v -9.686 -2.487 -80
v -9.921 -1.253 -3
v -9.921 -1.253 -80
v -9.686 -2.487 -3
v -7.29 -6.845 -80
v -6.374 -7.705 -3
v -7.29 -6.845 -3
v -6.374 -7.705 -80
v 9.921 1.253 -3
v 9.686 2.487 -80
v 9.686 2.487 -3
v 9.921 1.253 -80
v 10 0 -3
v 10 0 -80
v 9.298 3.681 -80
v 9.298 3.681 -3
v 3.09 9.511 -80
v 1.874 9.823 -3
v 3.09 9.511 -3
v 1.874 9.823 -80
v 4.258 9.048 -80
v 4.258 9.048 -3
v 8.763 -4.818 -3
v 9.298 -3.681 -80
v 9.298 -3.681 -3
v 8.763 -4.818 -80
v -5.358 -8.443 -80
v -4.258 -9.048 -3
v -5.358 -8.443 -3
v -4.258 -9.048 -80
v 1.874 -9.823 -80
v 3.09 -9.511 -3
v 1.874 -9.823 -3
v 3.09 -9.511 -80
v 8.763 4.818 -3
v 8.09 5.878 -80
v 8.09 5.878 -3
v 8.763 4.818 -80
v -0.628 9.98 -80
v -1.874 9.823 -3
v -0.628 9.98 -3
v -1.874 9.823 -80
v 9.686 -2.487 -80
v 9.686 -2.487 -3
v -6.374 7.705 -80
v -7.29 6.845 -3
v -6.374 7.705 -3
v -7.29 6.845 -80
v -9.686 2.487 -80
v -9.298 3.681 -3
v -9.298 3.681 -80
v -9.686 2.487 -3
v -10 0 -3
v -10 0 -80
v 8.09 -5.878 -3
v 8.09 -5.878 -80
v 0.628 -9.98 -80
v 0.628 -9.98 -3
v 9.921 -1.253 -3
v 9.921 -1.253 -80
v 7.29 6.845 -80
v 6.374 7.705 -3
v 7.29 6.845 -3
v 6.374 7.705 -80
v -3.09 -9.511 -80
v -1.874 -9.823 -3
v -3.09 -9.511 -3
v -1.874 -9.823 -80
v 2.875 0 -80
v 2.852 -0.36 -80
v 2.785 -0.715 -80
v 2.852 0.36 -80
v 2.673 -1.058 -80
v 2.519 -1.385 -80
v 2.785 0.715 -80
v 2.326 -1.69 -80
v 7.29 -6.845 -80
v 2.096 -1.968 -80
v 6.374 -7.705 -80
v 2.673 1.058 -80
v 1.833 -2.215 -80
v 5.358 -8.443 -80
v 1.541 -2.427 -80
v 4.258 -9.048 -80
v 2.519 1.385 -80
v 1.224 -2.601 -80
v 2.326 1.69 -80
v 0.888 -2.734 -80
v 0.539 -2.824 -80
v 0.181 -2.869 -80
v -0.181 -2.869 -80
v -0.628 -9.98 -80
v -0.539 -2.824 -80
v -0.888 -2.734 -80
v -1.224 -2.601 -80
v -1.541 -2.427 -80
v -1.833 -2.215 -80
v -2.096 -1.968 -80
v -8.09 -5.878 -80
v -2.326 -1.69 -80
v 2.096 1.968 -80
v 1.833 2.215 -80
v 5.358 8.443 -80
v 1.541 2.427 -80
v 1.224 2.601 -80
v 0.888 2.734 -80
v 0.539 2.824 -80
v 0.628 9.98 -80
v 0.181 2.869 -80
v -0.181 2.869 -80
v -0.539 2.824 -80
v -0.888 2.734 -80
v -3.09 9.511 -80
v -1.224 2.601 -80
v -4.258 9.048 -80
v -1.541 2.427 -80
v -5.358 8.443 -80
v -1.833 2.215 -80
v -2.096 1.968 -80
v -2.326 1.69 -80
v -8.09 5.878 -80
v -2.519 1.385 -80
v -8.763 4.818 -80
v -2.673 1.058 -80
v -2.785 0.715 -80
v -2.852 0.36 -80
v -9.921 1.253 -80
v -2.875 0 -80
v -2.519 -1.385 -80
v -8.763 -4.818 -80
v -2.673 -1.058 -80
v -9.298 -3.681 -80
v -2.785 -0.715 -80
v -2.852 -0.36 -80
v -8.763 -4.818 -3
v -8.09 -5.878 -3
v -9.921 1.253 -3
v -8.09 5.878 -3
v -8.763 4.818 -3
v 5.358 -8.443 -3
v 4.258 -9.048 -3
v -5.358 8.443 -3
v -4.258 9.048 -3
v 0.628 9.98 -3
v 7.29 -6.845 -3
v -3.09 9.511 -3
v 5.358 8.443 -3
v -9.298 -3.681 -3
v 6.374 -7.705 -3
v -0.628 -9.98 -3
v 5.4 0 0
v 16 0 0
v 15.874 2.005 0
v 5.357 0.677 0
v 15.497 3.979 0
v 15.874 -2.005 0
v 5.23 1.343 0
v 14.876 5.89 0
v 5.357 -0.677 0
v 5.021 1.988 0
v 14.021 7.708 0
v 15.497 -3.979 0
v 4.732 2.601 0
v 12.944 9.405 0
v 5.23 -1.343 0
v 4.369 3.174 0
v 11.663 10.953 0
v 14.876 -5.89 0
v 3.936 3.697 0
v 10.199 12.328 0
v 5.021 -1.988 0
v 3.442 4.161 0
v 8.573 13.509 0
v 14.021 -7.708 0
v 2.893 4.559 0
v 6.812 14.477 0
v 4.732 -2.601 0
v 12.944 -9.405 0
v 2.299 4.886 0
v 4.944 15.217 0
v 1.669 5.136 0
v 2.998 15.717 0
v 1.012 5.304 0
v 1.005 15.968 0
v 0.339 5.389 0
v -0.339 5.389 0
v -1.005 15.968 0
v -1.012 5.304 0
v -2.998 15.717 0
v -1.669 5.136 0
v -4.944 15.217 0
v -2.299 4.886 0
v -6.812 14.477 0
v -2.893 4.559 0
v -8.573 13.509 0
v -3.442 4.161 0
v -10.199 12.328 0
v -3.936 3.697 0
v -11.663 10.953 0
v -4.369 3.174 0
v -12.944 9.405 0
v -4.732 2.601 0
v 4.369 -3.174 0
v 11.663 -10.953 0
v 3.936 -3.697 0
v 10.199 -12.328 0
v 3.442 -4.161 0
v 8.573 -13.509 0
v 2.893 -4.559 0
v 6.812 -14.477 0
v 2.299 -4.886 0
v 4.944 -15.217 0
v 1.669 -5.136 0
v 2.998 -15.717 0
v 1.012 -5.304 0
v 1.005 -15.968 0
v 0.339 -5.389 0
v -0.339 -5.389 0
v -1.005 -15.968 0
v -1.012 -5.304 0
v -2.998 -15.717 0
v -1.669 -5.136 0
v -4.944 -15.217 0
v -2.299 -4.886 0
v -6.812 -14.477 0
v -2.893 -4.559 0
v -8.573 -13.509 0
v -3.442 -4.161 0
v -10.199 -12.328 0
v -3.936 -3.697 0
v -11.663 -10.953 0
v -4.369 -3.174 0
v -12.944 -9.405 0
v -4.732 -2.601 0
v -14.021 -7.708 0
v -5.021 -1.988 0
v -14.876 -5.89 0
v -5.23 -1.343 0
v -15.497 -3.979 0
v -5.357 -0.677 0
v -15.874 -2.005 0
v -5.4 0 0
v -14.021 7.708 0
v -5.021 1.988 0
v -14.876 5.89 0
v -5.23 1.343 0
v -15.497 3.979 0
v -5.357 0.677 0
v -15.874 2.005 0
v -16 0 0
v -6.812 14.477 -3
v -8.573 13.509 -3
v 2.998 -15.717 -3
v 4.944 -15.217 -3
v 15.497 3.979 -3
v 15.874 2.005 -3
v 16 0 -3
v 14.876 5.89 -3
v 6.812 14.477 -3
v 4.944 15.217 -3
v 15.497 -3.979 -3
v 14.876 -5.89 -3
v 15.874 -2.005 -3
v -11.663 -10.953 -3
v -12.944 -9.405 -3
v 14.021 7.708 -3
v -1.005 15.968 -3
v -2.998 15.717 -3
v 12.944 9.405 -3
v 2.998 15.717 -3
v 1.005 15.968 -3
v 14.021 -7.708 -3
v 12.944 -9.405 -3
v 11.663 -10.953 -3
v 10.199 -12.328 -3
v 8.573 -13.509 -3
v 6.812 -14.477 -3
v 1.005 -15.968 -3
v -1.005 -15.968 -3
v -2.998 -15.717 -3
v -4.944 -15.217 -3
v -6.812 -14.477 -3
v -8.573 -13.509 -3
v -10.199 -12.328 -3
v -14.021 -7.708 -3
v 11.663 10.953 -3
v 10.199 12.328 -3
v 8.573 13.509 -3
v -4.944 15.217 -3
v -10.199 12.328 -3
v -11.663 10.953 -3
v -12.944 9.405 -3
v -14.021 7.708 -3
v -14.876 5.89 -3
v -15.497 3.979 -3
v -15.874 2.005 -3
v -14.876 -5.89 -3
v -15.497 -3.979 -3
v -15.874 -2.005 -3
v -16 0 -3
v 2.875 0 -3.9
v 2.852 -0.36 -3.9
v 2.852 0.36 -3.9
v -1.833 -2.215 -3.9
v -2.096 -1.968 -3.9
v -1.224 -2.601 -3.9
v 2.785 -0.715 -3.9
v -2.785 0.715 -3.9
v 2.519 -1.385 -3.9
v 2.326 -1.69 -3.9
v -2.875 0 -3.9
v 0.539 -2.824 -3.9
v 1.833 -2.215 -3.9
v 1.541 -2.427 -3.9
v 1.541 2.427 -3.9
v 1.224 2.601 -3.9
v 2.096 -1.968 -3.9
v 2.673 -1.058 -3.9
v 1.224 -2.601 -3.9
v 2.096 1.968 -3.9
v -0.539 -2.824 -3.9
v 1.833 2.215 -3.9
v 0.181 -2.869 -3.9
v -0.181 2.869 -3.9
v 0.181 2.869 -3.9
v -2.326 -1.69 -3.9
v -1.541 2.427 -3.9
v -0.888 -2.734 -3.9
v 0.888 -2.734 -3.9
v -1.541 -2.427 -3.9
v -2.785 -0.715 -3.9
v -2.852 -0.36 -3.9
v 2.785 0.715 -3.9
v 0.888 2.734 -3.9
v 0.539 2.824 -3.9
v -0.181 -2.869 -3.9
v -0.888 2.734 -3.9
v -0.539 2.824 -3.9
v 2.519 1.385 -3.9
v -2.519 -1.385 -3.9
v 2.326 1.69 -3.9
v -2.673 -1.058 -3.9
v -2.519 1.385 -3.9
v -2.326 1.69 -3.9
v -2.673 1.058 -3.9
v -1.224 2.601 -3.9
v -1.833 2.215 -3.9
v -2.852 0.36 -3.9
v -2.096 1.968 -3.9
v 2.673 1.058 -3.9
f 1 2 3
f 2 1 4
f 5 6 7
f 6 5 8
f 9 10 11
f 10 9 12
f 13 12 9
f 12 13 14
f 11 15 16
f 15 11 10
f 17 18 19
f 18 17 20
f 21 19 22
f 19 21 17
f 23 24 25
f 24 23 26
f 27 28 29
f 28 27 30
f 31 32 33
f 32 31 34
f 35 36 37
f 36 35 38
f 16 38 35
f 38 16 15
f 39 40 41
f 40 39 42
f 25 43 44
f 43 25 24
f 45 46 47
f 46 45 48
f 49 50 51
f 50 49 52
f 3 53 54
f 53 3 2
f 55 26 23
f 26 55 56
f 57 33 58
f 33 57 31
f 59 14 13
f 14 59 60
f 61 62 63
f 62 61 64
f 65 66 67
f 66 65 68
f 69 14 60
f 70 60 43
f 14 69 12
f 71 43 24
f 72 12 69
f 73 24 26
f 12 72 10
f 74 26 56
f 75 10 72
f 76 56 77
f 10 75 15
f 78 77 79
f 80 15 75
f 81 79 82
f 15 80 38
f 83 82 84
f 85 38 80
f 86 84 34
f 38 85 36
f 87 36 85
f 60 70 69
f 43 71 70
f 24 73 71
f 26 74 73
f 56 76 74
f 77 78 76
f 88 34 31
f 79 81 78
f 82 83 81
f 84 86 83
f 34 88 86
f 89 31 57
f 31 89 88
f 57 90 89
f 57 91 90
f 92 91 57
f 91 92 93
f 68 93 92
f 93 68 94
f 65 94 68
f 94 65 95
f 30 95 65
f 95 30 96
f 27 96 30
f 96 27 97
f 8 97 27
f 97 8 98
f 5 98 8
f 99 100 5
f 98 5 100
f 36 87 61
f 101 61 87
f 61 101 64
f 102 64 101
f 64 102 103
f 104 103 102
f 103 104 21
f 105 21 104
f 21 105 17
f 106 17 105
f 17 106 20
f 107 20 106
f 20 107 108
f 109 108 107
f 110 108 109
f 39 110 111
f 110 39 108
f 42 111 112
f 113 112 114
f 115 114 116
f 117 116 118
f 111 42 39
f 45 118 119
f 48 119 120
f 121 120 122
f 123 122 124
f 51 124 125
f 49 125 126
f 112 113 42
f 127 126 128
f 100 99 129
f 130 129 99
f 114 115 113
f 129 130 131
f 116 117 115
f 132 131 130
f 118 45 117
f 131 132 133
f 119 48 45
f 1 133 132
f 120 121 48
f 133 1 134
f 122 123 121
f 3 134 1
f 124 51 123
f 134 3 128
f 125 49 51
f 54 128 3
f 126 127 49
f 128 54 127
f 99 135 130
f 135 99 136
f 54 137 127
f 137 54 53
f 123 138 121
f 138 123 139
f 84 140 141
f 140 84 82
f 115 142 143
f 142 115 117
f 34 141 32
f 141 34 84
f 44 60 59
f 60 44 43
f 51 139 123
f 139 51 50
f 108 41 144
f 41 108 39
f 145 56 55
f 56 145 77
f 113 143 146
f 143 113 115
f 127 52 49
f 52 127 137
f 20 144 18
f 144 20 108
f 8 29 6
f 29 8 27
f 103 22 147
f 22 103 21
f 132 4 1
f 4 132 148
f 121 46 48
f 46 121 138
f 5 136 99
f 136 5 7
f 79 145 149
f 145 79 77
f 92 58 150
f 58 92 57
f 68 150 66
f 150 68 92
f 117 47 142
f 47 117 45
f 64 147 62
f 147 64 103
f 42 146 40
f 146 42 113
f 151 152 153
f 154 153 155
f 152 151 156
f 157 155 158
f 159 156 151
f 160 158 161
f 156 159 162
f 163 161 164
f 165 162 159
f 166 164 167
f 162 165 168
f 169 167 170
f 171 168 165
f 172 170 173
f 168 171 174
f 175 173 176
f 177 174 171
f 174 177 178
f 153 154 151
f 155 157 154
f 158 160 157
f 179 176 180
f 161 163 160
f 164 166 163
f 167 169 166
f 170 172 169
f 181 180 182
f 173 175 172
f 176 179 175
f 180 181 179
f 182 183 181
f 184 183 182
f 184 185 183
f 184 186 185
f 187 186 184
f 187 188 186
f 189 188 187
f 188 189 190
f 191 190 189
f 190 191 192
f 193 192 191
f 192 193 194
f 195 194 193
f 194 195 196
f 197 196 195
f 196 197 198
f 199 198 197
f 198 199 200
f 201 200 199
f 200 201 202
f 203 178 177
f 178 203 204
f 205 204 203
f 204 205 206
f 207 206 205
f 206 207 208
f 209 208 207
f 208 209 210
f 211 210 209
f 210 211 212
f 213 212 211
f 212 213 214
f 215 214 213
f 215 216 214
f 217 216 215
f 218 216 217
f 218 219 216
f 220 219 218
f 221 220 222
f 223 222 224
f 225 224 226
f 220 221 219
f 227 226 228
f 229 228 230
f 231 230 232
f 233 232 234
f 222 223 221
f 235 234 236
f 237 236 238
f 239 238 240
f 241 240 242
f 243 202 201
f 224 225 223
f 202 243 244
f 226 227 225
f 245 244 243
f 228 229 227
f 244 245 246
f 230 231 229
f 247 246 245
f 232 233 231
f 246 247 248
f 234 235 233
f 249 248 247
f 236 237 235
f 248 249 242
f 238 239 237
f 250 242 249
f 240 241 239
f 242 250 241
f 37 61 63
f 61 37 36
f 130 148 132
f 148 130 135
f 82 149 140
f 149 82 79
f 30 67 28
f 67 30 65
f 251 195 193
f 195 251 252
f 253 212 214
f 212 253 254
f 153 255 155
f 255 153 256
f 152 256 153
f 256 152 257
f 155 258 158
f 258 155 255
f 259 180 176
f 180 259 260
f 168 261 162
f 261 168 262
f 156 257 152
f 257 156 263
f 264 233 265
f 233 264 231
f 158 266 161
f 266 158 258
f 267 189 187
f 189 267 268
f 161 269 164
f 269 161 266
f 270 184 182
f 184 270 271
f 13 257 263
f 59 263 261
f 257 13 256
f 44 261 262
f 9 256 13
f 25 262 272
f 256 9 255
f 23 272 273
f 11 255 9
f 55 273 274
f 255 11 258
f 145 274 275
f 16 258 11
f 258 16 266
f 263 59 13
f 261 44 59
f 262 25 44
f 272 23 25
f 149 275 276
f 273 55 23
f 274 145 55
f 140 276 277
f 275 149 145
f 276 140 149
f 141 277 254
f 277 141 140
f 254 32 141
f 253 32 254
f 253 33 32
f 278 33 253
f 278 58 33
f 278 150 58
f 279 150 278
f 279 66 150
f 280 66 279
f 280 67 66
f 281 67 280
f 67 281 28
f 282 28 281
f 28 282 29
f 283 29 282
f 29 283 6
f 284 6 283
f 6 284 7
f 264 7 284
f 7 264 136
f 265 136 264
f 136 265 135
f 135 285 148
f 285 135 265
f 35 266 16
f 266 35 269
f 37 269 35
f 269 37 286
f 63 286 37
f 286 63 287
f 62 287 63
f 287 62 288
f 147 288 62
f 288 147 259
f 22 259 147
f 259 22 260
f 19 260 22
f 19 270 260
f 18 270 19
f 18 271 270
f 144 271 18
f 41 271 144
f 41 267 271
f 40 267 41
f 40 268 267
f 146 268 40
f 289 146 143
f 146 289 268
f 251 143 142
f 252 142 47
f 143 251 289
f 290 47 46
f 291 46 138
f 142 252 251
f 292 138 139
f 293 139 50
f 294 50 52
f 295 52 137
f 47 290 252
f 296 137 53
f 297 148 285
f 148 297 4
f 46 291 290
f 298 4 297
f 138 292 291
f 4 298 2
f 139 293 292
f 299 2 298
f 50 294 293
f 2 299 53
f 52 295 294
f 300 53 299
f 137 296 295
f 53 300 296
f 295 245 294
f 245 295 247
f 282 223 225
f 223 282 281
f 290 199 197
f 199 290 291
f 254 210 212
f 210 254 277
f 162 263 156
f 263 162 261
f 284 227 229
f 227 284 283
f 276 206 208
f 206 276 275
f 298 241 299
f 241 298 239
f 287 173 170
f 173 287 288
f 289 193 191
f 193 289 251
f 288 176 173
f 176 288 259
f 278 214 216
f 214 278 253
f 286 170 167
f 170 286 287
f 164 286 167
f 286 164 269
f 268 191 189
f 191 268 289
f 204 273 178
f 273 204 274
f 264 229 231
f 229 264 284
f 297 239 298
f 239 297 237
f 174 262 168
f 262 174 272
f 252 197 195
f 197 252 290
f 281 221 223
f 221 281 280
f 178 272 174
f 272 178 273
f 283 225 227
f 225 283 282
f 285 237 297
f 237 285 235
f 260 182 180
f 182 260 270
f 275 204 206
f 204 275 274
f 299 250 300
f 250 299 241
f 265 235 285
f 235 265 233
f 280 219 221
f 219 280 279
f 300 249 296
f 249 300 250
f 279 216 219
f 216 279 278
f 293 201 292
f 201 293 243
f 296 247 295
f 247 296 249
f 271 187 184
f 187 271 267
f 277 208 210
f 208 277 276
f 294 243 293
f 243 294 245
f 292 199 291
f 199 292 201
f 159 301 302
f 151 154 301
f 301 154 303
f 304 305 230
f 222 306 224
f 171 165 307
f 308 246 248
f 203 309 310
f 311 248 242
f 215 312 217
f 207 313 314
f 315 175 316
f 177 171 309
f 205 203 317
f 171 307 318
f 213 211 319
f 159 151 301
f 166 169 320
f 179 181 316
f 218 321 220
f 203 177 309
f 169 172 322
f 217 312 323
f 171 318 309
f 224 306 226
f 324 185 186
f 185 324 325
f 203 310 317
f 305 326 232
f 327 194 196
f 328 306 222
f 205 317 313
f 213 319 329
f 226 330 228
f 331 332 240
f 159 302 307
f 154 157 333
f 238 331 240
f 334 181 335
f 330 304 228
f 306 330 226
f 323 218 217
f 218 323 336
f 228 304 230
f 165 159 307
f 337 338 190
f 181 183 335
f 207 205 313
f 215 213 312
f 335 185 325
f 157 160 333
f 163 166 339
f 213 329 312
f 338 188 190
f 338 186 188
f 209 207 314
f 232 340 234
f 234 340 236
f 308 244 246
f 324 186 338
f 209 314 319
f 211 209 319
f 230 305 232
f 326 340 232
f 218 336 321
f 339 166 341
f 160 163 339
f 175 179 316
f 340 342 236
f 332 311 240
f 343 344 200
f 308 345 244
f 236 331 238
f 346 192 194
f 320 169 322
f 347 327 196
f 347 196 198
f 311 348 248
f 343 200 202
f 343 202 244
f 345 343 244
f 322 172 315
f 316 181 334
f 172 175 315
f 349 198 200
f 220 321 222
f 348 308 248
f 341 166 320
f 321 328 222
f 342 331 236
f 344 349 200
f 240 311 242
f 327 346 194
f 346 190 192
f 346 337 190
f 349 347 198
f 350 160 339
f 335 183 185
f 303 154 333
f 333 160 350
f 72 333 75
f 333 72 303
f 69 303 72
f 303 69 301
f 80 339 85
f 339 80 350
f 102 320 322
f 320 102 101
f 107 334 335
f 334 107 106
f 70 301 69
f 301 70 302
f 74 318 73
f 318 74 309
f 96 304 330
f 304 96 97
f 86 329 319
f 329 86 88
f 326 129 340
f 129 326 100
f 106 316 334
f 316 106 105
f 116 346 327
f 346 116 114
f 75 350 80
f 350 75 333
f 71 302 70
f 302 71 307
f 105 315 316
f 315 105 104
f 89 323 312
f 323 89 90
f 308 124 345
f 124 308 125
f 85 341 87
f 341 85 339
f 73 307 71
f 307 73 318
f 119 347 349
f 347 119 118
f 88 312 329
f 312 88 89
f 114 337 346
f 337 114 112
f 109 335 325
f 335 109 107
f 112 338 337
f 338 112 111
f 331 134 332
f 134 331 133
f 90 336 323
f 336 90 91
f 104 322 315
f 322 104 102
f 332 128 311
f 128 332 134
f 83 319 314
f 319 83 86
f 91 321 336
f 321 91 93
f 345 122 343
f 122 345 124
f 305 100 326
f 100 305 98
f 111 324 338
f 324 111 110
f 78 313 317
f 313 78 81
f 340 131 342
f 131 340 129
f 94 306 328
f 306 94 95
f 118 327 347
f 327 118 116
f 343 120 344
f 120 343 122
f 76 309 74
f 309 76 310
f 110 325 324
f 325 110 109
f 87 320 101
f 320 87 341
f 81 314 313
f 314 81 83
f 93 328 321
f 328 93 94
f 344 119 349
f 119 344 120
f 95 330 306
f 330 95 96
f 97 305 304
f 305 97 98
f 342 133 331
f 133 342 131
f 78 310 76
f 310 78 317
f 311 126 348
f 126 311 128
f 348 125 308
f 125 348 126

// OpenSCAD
$fn = 50;


difference() {
	union() {
		translate(v = [0, 0, -80.0000000000]) {
			cylinder(h = 80, r = 10.0000000000);
		}
		translate(v = [0, 0, -3.0000000000]) {
			cylinder(h = 3, r = 16.0000000000);
		}
	}
	union() {
		translate(v = [0, 0, 0]) {
			rotate(a = [0, 0, 0]) {
				difference() {
					union() {
						#translate(v = [0, 0, -80.0000000000]) {
							cylinder(h = 80, r = 2.6000000000);
						}
						#translate(v = [0, 0, -3.9000000000]) {
							cylinder(h = 3.9000000000, r = 10.0000000000, r1 = 2.8750000000, r2 = 5.4000000000);
						}
						#translate(v = [0, 0, -80.0000000000]) {
							cylinder(h = 80, r = 2.8750000000);
						}
						#translate(v = [0, 0, -80.0000000000]) {
							cylinder(h = 80, r = 2.6000000000);
						}
					}
					union();
				}
			}
		}
	}
}
